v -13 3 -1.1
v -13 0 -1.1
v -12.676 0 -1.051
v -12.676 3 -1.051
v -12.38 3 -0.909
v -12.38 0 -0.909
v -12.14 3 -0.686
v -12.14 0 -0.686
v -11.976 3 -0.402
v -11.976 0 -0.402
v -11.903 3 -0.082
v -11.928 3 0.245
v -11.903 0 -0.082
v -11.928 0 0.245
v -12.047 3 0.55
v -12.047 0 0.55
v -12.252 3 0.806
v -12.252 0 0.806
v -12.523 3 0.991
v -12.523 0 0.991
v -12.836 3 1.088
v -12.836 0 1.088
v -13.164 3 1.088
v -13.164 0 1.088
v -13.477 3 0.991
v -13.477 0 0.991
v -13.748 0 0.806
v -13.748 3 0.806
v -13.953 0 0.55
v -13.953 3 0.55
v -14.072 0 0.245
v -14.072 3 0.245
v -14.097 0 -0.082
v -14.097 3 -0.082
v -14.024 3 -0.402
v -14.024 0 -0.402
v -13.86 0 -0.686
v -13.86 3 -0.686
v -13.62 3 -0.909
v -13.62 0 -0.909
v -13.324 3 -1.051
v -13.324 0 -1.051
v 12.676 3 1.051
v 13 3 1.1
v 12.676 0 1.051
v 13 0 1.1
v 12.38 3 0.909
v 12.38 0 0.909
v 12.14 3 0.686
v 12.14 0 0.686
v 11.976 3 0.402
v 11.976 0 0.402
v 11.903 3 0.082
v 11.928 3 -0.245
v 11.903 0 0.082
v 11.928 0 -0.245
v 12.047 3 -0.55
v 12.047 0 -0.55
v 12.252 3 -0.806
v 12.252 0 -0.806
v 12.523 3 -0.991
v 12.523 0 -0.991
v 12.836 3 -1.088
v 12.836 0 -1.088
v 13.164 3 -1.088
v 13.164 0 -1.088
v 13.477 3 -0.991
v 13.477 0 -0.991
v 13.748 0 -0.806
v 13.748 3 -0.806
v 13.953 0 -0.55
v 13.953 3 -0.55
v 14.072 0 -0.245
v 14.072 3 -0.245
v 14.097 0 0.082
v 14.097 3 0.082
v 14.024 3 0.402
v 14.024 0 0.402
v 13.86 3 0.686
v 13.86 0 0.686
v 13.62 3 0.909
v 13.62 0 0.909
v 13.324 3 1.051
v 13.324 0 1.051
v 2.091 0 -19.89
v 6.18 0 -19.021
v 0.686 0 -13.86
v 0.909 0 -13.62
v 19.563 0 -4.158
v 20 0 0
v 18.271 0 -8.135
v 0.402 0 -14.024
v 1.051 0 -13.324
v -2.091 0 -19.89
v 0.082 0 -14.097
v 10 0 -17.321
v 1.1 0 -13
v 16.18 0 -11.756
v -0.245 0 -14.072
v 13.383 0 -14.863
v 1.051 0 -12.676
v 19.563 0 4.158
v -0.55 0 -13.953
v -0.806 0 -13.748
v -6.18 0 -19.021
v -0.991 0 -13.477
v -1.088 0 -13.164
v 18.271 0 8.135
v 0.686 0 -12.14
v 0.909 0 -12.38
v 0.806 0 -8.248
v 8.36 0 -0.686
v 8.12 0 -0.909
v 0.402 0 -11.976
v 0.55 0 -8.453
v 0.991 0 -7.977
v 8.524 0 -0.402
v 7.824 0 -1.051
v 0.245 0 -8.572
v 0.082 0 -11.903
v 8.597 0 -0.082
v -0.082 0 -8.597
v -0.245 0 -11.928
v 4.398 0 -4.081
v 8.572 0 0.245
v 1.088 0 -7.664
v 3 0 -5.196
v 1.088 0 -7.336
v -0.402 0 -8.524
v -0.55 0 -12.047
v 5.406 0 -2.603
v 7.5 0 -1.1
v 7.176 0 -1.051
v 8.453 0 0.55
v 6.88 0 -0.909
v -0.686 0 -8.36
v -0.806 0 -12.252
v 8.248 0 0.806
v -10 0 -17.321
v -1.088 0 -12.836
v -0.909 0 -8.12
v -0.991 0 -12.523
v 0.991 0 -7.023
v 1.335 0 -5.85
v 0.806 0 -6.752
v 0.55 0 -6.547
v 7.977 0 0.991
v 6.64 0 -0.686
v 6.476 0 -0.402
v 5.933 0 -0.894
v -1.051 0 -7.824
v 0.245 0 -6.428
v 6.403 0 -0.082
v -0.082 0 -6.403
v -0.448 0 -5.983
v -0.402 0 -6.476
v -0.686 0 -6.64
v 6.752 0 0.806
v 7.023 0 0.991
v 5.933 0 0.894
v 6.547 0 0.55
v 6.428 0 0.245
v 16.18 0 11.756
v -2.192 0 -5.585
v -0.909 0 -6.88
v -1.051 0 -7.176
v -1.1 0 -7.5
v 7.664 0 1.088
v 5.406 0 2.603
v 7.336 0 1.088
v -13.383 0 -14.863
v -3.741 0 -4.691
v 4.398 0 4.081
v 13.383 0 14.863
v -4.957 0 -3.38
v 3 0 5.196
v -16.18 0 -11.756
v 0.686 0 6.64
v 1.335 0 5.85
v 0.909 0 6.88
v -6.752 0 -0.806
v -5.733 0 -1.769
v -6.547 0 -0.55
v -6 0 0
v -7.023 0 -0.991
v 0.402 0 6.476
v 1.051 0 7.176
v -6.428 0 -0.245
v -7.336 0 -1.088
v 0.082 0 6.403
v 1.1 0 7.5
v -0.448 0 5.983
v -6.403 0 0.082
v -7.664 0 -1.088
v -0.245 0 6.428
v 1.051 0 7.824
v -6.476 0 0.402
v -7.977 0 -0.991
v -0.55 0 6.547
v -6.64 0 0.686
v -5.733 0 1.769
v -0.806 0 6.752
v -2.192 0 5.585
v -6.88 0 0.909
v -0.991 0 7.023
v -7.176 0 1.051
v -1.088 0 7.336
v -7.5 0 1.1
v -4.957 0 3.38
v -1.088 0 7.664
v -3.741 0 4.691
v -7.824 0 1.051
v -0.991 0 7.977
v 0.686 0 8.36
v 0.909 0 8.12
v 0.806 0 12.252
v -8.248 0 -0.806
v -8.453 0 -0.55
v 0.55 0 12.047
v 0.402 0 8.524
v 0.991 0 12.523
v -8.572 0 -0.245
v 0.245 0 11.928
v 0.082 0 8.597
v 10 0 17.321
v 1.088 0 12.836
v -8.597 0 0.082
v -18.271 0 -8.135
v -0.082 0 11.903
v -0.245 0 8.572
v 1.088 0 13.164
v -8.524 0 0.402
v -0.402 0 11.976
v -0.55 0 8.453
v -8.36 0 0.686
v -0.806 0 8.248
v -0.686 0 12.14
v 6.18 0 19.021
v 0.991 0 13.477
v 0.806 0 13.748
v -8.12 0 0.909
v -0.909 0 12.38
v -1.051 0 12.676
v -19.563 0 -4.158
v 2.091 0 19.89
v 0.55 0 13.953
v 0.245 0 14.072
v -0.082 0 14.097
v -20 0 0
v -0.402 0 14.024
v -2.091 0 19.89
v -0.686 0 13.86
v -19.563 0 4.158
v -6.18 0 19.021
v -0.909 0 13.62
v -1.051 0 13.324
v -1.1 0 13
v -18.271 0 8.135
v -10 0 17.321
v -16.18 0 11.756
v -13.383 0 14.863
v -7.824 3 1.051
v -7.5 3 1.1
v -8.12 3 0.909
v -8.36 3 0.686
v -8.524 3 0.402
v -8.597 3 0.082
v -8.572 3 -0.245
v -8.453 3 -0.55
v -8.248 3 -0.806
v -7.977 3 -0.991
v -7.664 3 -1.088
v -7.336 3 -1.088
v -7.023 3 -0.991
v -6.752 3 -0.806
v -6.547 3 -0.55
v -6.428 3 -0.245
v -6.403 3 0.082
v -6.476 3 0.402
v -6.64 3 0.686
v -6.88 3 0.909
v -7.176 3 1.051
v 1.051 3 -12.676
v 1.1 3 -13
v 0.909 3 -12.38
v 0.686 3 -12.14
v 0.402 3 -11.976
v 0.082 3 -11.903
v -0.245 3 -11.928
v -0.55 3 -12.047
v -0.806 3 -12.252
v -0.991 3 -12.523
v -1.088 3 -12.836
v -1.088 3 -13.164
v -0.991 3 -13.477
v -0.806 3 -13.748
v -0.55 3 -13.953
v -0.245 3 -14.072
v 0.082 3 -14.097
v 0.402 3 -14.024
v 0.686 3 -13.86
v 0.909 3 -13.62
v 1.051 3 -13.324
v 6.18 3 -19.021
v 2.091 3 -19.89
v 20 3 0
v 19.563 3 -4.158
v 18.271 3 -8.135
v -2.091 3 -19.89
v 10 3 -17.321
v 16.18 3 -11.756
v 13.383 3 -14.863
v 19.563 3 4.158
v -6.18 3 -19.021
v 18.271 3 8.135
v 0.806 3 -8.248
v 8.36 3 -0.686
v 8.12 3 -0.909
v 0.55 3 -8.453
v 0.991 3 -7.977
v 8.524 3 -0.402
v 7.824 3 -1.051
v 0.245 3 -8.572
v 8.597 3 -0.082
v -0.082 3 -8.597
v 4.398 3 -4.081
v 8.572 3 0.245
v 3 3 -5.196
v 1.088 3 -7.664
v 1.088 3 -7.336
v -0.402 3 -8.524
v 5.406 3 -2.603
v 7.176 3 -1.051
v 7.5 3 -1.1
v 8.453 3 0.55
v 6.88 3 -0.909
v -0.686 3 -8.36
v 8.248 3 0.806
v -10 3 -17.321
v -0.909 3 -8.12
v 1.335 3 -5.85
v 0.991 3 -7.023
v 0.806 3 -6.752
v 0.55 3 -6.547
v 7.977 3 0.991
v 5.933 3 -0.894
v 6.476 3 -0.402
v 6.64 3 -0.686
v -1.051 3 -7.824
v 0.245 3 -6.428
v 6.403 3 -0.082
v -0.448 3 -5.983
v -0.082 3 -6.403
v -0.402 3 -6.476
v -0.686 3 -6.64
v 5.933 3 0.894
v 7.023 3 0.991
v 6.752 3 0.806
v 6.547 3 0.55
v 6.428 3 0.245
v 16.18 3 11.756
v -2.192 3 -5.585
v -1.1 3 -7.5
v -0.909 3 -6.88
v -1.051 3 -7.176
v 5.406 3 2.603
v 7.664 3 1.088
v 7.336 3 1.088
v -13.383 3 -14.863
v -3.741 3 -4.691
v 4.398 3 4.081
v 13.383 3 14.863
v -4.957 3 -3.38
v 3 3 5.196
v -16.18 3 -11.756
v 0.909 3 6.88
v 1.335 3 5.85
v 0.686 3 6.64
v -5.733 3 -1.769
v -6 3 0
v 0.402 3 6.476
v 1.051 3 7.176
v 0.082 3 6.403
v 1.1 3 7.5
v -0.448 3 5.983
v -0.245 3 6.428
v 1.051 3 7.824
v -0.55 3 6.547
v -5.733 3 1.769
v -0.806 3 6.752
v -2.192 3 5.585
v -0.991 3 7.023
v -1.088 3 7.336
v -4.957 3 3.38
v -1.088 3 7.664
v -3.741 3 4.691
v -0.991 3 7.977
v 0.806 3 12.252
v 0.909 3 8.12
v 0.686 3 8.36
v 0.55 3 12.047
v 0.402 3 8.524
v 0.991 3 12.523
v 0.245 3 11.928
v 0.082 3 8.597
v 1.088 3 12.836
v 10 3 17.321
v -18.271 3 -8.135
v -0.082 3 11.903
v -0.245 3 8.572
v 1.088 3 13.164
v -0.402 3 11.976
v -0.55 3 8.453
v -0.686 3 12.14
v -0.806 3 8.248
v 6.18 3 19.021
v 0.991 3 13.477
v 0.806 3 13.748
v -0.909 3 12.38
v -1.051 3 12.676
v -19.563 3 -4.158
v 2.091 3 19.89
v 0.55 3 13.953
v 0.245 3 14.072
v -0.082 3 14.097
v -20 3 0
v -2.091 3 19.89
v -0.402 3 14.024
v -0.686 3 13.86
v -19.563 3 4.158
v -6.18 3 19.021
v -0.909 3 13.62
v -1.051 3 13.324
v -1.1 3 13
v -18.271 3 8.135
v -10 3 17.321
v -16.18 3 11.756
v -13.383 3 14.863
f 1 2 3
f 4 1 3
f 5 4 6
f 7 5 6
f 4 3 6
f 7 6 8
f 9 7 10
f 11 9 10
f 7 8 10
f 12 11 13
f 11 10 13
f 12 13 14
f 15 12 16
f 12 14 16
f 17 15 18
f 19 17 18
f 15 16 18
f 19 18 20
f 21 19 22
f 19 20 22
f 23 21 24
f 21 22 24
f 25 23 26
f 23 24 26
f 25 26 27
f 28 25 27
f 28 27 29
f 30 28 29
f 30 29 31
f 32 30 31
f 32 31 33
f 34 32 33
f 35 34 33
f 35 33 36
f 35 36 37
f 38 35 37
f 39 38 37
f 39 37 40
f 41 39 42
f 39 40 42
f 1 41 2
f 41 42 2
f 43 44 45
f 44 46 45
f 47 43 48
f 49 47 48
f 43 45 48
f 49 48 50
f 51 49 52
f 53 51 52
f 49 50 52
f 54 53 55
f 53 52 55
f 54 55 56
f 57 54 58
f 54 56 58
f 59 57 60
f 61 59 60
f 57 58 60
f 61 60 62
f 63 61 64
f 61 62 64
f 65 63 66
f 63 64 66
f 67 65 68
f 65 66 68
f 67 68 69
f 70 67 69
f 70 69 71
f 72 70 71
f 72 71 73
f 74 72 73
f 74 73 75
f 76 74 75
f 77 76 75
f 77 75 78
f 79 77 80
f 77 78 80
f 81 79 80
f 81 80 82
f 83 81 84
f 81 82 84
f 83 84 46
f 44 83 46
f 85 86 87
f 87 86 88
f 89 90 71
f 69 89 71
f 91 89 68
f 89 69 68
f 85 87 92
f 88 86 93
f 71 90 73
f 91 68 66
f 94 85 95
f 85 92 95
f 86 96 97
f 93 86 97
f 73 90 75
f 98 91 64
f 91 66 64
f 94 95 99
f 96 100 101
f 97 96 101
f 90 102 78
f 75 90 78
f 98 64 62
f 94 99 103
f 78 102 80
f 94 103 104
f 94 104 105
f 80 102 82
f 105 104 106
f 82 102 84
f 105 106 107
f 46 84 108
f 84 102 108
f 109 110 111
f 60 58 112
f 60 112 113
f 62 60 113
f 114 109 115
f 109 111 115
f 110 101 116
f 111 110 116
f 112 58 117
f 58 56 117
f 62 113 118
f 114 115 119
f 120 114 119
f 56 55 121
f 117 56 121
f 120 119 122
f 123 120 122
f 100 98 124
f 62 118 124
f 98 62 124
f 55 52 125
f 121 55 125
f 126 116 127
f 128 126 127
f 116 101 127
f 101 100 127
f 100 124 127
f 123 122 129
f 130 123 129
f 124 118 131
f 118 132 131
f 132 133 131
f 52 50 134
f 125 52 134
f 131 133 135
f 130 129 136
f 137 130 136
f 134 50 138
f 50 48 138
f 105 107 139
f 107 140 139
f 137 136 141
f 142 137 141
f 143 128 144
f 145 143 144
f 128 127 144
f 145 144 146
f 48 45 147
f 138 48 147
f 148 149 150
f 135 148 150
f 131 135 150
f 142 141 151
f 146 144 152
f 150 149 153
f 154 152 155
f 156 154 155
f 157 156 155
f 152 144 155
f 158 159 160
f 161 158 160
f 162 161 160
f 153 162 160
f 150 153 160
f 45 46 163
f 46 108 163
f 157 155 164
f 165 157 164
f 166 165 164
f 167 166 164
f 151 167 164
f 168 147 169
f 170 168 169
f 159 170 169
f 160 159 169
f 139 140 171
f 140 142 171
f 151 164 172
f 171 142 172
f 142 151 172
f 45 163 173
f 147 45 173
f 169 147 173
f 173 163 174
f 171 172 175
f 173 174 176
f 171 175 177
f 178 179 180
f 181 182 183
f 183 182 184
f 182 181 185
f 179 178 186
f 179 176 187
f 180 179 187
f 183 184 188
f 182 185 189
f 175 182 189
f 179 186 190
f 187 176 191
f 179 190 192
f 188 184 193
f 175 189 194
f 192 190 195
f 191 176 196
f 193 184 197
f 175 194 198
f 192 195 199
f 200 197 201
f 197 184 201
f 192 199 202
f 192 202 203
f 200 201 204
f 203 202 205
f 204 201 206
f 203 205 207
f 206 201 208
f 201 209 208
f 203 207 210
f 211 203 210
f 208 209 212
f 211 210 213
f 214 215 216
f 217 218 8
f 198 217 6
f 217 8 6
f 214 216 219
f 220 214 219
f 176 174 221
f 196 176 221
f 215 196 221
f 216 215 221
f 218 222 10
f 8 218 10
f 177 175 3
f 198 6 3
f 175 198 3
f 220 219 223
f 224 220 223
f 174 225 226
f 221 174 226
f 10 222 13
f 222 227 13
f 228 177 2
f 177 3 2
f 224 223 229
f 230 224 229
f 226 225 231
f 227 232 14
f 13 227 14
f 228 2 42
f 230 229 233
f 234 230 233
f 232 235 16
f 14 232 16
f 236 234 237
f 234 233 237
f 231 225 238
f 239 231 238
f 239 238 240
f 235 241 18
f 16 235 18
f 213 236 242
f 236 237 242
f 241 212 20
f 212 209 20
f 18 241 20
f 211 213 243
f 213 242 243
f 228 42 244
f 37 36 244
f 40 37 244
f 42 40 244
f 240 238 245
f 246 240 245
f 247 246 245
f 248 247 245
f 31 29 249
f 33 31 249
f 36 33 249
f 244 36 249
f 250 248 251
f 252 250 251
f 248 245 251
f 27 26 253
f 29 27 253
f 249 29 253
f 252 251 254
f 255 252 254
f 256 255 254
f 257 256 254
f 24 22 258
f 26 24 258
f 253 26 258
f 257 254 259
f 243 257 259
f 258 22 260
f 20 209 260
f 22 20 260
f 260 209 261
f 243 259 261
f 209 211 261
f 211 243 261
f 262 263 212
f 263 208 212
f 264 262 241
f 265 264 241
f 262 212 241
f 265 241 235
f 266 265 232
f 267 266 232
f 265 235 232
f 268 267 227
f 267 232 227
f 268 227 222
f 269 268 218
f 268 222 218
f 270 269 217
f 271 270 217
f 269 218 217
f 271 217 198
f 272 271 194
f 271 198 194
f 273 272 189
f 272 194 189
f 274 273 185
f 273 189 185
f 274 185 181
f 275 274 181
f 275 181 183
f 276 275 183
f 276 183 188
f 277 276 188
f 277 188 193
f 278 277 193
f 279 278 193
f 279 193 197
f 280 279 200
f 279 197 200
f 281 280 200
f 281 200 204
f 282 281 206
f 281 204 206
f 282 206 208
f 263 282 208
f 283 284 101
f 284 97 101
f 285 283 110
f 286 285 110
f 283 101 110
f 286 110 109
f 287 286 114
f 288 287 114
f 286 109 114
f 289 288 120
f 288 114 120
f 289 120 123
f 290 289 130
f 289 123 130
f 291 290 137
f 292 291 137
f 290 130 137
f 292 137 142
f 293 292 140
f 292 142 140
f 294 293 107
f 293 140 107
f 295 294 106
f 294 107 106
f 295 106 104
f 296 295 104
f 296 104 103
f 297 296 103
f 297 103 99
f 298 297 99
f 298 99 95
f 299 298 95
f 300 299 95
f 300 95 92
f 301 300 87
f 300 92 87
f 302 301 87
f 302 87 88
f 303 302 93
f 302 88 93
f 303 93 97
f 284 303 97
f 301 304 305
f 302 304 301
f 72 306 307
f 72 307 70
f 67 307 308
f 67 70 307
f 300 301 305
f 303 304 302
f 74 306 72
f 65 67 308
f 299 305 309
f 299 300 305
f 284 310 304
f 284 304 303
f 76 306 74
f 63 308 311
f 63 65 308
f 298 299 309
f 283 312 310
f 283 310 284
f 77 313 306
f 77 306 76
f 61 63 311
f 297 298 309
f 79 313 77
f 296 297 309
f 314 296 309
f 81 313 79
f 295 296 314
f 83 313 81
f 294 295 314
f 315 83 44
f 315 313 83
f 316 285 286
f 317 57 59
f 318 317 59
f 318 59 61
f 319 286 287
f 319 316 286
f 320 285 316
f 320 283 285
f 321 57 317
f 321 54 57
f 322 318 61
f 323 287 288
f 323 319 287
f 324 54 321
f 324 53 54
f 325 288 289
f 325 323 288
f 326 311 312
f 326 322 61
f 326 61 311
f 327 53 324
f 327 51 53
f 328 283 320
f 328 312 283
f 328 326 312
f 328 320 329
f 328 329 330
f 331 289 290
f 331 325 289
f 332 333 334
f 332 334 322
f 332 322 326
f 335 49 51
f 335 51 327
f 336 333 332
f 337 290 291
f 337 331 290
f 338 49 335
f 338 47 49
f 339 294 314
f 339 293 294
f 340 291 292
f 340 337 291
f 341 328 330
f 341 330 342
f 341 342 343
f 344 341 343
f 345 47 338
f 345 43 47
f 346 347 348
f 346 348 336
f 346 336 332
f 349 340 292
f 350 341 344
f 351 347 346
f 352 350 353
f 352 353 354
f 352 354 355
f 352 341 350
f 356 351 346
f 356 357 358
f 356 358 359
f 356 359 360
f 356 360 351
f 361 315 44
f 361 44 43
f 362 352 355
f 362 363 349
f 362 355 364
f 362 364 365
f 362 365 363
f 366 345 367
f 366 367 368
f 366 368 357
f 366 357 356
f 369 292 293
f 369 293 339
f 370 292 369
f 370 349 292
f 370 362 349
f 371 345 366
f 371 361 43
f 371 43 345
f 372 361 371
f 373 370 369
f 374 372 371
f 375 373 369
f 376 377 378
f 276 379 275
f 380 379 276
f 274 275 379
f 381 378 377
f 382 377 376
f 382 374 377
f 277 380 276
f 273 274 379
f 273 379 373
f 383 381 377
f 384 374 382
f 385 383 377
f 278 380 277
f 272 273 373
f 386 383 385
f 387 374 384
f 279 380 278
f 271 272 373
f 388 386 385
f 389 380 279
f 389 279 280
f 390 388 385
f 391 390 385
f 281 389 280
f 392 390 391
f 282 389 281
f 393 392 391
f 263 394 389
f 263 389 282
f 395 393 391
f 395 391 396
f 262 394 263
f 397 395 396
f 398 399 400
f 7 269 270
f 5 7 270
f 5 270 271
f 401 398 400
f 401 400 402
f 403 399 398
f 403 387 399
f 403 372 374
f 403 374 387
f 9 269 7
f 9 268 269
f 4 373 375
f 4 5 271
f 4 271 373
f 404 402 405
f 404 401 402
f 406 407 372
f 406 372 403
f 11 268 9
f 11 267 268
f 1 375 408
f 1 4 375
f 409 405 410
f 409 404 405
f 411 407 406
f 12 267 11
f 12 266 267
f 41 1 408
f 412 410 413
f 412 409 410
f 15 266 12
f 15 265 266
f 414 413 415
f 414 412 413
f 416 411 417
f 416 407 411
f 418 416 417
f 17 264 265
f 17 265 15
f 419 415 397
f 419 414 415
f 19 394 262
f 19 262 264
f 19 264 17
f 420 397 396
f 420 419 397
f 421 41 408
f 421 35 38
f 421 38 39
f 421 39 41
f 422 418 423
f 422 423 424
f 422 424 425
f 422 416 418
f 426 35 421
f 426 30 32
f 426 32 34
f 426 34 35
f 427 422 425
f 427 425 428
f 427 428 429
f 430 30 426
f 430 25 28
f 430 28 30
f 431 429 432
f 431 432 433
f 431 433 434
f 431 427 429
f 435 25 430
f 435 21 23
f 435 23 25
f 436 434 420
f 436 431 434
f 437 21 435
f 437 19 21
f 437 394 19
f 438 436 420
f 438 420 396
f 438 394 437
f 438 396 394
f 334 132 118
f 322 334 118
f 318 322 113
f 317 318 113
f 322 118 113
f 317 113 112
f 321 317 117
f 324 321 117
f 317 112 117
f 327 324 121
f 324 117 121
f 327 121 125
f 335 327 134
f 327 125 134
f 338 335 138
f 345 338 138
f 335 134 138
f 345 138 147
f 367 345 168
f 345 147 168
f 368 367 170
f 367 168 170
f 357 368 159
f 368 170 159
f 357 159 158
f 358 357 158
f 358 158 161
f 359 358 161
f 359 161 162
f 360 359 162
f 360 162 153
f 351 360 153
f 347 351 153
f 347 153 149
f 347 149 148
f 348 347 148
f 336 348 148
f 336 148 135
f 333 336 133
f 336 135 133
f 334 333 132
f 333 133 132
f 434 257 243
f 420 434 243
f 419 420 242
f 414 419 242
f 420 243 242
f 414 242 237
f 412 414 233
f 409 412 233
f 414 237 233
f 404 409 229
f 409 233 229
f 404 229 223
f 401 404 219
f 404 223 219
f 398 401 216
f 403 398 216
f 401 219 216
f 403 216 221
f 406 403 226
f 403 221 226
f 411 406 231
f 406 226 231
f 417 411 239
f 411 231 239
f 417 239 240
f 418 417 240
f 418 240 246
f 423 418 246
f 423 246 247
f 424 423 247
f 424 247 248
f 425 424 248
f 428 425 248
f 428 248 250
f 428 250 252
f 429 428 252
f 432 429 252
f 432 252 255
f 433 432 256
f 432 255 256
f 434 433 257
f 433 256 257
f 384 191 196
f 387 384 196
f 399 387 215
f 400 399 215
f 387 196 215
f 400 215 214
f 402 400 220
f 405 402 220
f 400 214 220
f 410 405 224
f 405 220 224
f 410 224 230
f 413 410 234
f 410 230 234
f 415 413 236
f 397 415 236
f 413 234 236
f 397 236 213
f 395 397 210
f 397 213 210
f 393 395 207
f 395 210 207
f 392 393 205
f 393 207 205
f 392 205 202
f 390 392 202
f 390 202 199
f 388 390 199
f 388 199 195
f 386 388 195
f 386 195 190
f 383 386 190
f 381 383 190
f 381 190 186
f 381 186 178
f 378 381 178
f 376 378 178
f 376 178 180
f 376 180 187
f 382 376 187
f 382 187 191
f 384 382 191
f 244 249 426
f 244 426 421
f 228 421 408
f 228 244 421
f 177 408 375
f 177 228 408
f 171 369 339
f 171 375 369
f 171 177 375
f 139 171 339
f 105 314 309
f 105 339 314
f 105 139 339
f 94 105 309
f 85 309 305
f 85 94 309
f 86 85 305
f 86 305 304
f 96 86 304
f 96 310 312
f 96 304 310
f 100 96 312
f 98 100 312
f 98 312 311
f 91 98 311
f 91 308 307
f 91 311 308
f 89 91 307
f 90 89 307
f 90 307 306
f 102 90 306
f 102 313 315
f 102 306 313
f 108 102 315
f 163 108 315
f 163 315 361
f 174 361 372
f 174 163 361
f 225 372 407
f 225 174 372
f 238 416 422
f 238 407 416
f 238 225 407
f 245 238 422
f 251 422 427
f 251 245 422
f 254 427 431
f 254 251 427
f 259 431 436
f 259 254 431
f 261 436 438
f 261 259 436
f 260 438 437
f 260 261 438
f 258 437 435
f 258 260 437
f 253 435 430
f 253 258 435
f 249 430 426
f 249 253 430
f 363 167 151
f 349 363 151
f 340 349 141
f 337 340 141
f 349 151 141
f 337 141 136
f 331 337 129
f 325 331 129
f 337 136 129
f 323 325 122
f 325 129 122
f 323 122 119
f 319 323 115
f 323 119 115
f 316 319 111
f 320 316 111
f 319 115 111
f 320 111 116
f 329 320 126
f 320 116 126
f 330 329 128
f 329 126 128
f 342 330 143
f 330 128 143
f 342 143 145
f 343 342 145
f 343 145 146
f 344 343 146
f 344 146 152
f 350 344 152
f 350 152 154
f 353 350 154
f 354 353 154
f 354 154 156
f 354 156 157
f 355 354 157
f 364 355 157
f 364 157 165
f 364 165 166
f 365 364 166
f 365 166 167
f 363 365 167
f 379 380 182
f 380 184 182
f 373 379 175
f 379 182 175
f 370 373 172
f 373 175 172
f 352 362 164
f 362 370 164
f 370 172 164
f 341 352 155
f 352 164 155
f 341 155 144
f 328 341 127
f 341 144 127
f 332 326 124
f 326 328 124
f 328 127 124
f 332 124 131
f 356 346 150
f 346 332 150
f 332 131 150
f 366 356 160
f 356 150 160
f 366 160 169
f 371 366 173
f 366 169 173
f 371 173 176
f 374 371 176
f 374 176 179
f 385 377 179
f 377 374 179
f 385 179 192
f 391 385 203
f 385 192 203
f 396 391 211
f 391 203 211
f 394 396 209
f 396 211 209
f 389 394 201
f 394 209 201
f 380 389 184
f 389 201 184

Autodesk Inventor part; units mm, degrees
ref_plane "YZ Plane" through (0, 0, 0) normal (1, 0, 0) x (0, 1, 0)
ref_plane "XZ Plane" through (0, 0, 0) normal (0, 1, 0) x (-1, 0, 0)
ref_plane "XY Plane" through (0, 0, 0) normal (0, 0, 1) x (1, 0, 0)
sketch "Sketch1" plane through (0, 0, 0) normal (0, 1, 0) x (-1, 0, 0)
  circle A0 centre (0, 0) radius 20
  circle A1 centre (0, 0) radius 6
  dimension "d0" = 40
  dimension "d1" = 12
extrude "Extrusion1" add sketch "Sketch1" along normal blind 3
sketch "Sketch2" plane through (0, 3, 0) normal (0, 1, 0) x (1, 0, 0)
  circle A0 centre (0, 0) radius 7.5
  point P0 (-7.5, 0)
  dimension "d4" = 15
hole "Hole1" at (-7.5, 3, 0) direction (0, -1, 0) diameter 2.2 end through all
pattern_circular "Circular Pattern1" count 4 over 360 about axis through (0, 0, 0) along (0, 1, 0) of "Hole1"
sketch "Sketch4" plane through (0, 3, 0) normal (0, 1, 0) x (1, 0, 0)
  line L0 (0, 0) -> (13, 0)
  dimension "d27" = 13
hole "Hole3" at (13, 3, 0) direction (0, -1, 0) diameter 2.2 end through all
pattern_circular "Circular Pattern3" count 4 over 360 about axis through (0, 0, 0) along (0, 1, 0) of "Hole3"
properties part number "back2"
